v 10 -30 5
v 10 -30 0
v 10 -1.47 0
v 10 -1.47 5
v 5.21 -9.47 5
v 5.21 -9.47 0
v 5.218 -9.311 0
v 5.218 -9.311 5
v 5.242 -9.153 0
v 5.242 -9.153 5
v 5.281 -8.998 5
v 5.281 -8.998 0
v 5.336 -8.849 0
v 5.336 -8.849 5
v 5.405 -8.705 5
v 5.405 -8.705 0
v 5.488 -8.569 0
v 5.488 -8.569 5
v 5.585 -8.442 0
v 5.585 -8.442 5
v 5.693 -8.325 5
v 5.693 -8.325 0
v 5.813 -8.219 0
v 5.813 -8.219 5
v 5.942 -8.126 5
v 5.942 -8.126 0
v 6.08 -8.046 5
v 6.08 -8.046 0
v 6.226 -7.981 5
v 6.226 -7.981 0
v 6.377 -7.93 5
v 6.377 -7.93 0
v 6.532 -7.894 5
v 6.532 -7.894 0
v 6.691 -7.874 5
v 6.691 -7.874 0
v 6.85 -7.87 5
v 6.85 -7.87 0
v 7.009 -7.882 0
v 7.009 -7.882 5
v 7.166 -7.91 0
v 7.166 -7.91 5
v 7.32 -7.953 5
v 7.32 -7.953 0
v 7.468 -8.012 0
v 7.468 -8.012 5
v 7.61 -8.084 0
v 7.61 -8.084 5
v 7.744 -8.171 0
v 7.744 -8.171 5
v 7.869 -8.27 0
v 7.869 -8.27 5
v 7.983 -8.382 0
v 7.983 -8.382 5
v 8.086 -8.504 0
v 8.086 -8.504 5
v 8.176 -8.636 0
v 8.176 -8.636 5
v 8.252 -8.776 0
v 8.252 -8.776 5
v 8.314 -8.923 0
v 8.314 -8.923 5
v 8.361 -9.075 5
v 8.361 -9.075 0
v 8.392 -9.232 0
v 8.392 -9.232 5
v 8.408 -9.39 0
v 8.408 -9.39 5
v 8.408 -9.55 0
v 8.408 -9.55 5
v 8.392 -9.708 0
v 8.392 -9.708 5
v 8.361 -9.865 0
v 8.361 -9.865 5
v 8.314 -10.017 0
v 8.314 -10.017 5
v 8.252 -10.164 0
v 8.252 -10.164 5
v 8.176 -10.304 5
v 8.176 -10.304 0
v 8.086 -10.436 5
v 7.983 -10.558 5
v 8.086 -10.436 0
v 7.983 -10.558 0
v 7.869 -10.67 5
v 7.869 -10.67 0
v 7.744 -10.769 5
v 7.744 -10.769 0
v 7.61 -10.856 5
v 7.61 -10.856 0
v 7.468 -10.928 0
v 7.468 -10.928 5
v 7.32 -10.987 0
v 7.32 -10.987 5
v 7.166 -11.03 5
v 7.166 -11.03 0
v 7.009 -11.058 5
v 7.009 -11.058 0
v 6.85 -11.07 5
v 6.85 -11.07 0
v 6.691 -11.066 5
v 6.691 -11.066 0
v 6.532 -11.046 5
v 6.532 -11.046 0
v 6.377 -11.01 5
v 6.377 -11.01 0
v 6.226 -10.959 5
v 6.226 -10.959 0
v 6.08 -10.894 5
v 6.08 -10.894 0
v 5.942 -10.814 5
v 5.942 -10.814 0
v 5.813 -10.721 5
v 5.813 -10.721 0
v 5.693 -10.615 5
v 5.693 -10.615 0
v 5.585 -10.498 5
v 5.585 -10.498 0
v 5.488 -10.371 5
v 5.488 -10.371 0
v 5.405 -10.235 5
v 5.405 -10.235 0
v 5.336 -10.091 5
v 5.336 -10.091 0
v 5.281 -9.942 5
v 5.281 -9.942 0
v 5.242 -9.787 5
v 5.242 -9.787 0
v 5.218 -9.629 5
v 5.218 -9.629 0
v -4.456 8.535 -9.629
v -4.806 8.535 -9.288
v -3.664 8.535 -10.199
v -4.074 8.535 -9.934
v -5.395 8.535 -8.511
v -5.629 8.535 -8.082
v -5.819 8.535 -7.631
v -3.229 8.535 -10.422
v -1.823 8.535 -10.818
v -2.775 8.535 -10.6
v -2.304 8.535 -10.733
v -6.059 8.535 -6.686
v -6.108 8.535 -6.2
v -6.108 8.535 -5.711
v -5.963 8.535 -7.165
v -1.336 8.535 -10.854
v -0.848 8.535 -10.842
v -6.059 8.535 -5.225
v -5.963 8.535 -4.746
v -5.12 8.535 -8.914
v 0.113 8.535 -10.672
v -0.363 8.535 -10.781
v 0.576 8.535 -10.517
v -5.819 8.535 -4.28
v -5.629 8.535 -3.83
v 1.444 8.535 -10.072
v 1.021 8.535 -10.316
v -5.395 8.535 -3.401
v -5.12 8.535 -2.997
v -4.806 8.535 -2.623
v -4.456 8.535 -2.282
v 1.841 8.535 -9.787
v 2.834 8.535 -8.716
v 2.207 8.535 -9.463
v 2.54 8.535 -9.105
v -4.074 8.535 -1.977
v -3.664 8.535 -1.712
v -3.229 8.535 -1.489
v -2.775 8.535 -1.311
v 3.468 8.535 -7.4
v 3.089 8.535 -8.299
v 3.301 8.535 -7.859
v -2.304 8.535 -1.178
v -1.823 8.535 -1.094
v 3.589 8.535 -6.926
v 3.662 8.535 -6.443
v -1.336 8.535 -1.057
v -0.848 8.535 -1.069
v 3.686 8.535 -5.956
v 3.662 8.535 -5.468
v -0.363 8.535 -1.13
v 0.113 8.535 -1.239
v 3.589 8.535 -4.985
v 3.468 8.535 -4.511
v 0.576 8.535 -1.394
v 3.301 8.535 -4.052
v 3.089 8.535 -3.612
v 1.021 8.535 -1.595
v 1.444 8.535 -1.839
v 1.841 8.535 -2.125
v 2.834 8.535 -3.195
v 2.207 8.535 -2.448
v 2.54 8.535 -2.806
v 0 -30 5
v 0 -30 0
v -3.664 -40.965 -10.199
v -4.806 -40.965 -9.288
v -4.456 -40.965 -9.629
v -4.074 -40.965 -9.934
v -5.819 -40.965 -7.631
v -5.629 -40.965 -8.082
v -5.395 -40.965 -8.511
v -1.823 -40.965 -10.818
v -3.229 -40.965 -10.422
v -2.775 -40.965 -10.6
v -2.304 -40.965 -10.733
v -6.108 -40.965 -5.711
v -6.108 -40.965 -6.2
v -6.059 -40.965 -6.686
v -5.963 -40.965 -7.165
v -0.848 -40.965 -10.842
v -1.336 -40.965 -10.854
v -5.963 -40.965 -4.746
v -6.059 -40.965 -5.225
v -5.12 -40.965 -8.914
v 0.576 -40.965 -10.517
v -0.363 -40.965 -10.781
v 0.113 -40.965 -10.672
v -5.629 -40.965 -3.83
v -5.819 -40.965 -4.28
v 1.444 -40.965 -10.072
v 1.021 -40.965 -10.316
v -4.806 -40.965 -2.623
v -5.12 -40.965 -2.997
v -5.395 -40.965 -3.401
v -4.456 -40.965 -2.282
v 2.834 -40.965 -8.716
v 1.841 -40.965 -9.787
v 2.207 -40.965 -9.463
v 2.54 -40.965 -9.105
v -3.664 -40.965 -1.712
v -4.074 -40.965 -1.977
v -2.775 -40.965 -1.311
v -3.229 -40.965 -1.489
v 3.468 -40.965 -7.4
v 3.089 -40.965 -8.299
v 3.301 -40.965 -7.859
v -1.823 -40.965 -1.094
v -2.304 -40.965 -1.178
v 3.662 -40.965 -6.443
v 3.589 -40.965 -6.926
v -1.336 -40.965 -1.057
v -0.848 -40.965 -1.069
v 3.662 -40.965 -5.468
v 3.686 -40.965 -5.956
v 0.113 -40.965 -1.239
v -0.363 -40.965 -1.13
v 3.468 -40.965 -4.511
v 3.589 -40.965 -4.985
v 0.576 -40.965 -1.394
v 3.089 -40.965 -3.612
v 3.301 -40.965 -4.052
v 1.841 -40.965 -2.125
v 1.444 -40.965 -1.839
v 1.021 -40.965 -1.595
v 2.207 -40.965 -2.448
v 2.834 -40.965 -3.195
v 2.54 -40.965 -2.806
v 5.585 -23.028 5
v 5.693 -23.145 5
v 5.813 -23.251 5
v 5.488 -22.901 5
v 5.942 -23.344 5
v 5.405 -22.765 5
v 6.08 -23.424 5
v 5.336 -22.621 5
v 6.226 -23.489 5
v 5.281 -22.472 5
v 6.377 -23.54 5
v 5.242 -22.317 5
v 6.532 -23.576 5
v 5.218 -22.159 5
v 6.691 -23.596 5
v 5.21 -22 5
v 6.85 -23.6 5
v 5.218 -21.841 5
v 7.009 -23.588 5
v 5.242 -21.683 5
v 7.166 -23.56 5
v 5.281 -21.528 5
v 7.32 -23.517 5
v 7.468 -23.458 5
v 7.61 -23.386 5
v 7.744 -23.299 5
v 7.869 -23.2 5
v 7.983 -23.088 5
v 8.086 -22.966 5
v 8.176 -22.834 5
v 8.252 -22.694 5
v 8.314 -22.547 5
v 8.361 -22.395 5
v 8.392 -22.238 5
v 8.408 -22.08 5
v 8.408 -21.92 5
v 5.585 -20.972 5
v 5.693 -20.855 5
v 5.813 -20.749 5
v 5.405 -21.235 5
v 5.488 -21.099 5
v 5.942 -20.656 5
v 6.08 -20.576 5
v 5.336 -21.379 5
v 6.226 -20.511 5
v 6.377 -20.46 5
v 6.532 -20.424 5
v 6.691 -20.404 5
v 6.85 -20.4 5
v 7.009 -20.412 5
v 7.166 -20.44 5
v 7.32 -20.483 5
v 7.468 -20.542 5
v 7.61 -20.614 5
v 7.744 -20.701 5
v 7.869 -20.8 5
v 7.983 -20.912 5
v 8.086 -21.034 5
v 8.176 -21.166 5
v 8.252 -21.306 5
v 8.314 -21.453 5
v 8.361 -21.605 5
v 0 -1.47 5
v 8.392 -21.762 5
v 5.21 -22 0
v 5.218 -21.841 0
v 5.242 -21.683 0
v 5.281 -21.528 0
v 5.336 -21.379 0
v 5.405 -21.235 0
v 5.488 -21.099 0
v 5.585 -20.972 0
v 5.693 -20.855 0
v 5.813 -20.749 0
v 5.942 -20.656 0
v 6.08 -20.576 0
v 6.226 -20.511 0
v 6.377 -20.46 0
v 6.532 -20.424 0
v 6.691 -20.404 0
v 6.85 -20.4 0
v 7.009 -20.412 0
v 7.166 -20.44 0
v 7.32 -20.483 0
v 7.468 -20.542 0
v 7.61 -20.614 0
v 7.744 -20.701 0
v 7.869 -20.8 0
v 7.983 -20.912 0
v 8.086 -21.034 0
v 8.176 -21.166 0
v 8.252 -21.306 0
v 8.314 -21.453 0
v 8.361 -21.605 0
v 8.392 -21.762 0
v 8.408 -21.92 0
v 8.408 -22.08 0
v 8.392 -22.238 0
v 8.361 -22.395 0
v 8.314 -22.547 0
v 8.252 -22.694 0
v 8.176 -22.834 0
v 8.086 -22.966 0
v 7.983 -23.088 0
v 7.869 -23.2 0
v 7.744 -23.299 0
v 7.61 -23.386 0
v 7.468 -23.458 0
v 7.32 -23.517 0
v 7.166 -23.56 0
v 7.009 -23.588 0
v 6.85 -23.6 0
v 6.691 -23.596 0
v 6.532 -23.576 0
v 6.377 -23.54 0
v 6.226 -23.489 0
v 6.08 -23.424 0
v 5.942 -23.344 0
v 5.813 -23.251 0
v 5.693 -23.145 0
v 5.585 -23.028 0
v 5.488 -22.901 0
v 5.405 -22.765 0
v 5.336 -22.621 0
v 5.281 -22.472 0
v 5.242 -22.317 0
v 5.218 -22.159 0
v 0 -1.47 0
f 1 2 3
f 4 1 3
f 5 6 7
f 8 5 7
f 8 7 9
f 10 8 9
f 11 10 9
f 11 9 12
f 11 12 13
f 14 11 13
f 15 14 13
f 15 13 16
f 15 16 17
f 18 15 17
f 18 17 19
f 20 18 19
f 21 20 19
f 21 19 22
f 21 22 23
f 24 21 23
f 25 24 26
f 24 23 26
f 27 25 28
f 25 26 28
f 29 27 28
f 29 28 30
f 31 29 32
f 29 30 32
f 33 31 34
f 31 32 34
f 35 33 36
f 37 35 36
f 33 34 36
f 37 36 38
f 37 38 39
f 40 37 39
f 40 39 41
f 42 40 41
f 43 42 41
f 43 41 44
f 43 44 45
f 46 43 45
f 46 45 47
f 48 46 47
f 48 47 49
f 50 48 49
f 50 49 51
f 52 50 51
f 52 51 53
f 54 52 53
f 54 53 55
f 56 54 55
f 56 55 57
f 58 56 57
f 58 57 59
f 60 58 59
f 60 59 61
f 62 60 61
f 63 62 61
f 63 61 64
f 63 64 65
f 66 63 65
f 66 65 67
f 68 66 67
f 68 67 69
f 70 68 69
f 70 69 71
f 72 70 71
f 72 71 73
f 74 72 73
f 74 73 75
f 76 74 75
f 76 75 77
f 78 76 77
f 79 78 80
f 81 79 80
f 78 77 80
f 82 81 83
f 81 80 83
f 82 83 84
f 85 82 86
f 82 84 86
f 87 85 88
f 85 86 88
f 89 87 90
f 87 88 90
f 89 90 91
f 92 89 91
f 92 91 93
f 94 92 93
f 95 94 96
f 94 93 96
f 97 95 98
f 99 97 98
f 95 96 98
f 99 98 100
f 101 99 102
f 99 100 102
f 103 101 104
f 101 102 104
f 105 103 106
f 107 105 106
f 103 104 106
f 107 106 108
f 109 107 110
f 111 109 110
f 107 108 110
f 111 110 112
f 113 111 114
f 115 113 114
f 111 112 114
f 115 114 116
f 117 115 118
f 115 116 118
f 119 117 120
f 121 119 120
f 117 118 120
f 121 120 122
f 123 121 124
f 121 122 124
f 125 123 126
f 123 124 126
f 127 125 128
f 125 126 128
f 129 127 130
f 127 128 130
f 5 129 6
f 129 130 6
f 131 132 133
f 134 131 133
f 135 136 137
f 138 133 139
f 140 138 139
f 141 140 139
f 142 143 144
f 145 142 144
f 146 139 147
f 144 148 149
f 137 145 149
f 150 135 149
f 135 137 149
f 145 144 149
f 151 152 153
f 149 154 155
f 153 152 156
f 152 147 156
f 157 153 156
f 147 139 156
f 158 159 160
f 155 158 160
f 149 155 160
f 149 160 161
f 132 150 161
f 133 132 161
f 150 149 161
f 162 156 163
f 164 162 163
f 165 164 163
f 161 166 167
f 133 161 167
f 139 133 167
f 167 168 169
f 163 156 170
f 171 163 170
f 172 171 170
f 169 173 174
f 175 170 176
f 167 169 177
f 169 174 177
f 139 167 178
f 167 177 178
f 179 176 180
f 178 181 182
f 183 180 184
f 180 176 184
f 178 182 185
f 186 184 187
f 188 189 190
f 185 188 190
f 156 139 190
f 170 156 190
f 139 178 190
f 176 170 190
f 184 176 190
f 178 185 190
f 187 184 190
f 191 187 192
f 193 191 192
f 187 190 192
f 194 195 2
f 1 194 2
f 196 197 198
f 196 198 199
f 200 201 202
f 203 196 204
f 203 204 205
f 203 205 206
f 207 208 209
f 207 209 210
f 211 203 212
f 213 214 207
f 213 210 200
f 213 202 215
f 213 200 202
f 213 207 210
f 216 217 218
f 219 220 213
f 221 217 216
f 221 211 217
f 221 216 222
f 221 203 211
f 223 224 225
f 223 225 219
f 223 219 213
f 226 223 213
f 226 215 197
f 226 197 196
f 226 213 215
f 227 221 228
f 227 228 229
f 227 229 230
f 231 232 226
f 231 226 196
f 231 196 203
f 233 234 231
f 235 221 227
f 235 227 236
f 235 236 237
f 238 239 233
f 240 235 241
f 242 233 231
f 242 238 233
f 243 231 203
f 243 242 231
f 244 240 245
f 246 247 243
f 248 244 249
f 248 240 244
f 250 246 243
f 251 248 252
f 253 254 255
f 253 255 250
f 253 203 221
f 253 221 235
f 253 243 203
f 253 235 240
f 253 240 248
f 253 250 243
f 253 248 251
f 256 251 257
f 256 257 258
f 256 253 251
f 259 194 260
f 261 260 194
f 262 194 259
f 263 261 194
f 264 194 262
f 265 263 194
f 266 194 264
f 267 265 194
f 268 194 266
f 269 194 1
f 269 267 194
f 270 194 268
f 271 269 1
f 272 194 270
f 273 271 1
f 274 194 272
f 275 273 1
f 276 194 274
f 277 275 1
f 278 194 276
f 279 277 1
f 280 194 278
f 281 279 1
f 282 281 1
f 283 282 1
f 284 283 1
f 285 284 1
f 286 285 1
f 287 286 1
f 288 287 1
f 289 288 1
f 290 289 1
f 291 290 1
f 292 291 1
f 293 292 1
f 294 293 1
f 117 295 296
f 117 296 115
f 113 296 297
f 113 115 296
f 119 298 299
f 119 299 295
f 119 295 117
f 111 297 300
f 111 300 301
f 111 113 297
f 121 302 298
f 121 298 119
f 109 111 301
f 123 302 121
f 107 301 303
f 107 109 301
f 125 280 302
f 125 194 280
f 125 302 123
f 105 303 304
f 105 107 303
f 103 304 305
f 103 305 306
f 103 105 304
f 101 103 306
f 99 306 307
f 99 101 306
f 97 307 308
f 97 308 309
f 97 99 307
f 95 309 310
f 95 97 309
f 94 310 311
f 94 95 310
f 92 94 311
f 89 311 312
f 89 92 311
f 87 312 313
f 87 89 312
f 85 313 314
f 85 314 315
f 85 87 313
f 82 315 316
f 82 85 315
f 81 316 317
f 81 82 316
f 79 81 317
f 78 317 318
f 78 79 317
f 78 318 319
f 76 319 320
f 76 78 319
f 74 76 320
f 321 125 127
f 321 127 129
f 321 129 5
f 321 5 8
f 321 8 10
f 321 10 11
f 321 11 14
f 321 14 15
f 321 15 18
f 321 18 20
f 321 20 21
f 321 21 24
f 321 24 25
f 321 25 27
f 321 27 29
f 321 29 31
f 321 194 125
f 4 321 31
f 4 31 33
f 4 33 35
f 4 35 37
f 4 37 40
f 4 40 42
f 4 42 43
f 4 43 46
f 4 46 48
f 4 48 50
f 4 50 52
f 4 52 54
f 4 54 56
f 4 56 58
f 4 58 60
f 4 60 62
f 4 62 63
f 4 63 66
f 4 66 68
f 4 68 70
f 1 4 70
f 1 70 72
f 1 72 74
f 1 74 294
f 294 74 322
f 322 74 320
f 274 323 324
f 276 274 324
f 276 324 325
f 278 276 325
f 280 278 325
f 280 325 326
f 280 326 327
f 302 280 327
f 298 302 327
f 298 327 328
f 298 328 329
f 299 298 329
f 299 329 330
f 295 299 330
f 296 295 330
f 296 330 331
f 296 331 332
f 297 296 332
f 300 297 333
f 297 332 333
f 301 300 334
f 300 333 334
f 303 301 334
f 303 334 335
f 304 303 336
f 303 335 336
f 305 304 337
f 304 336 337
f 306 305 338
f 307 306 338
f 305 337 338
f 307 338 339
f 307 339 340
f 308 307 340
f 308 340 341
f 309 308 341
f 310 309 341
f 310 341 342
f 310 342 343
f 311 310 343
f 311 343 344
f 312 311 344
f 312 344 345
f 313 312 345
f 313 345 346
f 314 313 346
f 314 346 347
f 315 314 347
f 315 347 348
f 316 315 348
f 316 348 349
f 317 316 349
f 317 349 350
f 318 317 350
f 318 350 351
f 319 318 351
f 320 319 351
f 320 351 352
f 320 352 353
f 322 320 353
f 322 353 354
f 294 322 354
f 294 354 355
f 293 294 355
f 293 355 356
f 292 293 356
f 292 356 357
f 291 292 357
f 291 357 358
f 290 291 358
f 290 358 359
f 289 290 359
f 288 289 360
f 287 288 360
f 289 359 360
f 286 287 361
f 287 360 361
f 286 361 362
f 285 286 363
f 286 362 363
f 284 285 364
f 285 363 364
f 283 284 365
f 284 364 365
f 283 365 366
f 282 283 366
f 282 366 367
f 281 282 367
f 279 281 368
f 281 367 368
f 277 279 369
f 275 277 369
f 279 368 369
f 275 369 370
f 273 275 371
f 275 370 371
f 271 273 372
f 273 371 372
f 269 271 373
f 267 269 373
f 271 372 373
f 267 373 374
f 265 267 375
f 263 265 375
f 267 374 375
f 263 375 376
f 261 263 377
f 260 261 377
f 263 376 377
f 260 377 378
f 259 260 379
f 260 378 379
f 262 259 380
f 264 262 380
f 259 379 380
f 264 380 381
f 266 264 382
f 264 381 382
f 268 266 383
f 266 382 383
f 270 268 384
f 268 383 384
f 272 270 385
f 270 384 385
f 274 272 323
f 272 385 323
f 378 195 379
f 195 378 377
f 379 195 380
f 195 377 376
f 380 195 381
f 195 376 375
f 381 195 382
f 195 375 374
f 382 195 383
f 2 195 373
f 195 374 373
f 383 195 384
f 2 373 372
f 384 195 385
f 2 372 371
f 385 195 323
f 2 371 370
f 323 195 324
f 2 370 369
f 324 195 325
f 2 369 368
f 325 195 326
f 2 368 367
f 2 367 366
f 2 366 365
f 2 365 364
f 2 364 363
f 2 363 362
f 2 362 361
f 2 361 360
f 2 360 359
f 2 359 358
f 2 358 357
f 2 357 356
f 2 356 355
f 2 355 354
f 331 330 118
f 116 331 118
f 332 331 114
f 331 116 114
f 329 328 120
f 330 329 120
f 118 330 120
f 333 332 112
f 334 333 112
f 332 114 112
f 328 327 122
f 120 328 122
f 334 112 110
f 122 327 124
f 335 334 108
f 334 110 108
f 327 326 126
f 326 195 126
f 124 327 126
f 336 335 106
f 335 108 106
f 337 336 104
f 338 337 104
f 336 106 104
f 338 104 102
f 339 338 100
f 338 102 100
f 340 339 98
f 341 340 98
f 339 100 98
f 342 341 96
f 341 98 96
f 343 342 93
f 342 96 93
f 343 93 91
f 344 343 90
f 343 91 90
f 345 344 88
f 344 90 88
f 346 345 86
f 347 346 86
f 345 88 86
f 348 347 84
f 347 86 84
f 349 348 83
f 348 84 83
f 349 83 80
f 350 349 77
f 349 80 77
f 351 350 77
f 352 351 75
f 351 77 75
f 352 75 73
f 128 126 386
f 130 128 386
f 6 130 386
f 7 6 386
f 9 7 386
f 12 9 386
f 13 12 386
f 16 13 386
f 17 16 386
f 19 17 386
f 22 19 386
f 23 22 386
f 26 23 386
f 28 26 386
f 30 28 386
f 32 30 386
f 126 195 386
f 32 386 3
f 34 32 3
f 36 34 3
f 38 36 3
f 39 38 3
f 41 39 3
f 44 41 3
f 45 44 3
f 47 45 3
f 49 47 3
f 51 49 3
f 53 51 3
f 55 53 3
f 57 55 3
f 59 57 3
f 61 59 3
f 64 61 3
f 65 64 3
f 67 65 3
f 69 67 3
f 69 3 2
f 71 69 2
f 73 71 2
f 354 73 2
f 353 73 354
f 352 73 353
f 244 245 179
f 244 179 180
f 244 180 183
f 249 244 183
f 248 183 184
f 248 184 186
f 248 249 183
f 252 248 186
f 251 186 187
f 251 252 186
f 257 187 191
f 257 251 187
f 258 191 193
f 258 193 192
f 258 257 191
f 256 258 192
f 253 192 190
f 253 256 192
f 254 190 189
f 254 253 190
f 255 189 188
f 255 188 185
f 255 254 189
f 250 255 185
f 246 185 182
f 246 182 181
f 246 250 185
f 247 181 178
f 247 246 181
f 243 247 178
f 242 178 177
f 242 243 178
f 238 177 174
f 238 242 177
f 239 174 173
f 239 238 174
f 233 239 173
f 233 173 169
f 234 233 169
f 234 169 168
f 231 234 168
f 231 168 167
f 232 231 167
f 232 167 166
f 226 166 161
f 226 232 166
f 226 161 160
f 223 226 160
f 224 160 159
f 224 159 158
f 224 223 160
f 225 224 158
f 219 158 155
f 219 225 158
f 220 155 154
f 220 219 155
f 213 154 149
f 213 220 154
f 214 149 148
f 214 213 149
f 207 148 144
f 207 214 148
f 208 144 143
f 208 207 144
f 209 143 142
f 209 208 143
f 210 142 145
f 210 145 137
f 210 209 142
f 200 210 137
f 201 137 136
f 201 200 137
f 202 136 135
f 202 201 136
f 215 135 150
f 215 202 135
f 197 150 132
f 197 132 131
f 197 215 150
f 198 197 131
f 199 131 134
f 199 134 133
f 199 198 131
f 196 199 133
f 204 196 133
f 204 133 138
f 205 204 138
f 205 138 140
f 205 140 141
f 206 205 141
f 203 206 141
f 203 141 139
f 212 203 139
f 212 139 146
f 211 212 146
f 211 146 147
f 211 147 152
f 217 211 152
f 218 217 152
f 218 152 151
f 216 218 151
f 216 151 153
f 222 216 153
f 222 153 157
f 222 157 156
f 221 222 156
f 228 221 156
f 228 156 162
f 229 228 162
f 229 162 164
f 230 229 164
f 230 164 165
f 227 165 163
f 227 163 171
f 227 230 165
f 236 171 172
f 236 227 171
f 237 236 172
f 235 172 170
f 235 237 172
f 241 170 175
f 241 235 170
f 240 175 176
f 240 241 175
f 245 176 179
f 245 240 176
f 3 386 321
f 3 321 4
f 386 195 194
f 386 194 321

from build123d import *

# Parameters (mm, degrees)
SKETCH1_W           = 10
SKETCH1_H           = 28.53
BOSS_EXTRUDE1_DEPTH = 5
SKETCH2_R           = 1.6
CUT_EXTRUDE2_DEPTH  = 43
SKETCH10_R          = 4.9
BOSS_EXTRUDE7_DEPTH = 49.5


with BuildPart() as part:
    # Sketch1 → Boss-Extrude1 (new body)
    with BuildSketch(Plane.XY):
        with Locations((5, -15.735)):
            Rectangle(SKETCH1_W, SKETCH1_H)
    extrude(amount=BOSS_EXTRUDE1_DEPTH)

    # Sketch2 → Cut-Extrude2 (cut)
    with BuildSketch(Plane(origin=(0, 0, 0), x_dir=(-1, 0, 0), z_dir=(0, 0, -1))):
        with Locations((-6.810310374, -9.47)):
            Circle(SKETCH2_R)
        with Locations((-6.810310374, -22)):
            Circle(SKETCH2_R)
    extrude(amount=-CUT_EXTRUDE2_DEPTH, mode=Mode.SUBTRACT)


with BuildPart() as body_2:
    # Sketch10 → Boss-Extrude7 (new body)
    with BuildSketch(Plane.XZ.offset(40.965189842)):
        with Locations((-1.214108885, -5.955533219)):
            Circle(SKETCH10_R)
    extrude(amount=-BOSS_EXTRUDE7_DEPTH)


solid = Compound([part.part, body_2.part])
